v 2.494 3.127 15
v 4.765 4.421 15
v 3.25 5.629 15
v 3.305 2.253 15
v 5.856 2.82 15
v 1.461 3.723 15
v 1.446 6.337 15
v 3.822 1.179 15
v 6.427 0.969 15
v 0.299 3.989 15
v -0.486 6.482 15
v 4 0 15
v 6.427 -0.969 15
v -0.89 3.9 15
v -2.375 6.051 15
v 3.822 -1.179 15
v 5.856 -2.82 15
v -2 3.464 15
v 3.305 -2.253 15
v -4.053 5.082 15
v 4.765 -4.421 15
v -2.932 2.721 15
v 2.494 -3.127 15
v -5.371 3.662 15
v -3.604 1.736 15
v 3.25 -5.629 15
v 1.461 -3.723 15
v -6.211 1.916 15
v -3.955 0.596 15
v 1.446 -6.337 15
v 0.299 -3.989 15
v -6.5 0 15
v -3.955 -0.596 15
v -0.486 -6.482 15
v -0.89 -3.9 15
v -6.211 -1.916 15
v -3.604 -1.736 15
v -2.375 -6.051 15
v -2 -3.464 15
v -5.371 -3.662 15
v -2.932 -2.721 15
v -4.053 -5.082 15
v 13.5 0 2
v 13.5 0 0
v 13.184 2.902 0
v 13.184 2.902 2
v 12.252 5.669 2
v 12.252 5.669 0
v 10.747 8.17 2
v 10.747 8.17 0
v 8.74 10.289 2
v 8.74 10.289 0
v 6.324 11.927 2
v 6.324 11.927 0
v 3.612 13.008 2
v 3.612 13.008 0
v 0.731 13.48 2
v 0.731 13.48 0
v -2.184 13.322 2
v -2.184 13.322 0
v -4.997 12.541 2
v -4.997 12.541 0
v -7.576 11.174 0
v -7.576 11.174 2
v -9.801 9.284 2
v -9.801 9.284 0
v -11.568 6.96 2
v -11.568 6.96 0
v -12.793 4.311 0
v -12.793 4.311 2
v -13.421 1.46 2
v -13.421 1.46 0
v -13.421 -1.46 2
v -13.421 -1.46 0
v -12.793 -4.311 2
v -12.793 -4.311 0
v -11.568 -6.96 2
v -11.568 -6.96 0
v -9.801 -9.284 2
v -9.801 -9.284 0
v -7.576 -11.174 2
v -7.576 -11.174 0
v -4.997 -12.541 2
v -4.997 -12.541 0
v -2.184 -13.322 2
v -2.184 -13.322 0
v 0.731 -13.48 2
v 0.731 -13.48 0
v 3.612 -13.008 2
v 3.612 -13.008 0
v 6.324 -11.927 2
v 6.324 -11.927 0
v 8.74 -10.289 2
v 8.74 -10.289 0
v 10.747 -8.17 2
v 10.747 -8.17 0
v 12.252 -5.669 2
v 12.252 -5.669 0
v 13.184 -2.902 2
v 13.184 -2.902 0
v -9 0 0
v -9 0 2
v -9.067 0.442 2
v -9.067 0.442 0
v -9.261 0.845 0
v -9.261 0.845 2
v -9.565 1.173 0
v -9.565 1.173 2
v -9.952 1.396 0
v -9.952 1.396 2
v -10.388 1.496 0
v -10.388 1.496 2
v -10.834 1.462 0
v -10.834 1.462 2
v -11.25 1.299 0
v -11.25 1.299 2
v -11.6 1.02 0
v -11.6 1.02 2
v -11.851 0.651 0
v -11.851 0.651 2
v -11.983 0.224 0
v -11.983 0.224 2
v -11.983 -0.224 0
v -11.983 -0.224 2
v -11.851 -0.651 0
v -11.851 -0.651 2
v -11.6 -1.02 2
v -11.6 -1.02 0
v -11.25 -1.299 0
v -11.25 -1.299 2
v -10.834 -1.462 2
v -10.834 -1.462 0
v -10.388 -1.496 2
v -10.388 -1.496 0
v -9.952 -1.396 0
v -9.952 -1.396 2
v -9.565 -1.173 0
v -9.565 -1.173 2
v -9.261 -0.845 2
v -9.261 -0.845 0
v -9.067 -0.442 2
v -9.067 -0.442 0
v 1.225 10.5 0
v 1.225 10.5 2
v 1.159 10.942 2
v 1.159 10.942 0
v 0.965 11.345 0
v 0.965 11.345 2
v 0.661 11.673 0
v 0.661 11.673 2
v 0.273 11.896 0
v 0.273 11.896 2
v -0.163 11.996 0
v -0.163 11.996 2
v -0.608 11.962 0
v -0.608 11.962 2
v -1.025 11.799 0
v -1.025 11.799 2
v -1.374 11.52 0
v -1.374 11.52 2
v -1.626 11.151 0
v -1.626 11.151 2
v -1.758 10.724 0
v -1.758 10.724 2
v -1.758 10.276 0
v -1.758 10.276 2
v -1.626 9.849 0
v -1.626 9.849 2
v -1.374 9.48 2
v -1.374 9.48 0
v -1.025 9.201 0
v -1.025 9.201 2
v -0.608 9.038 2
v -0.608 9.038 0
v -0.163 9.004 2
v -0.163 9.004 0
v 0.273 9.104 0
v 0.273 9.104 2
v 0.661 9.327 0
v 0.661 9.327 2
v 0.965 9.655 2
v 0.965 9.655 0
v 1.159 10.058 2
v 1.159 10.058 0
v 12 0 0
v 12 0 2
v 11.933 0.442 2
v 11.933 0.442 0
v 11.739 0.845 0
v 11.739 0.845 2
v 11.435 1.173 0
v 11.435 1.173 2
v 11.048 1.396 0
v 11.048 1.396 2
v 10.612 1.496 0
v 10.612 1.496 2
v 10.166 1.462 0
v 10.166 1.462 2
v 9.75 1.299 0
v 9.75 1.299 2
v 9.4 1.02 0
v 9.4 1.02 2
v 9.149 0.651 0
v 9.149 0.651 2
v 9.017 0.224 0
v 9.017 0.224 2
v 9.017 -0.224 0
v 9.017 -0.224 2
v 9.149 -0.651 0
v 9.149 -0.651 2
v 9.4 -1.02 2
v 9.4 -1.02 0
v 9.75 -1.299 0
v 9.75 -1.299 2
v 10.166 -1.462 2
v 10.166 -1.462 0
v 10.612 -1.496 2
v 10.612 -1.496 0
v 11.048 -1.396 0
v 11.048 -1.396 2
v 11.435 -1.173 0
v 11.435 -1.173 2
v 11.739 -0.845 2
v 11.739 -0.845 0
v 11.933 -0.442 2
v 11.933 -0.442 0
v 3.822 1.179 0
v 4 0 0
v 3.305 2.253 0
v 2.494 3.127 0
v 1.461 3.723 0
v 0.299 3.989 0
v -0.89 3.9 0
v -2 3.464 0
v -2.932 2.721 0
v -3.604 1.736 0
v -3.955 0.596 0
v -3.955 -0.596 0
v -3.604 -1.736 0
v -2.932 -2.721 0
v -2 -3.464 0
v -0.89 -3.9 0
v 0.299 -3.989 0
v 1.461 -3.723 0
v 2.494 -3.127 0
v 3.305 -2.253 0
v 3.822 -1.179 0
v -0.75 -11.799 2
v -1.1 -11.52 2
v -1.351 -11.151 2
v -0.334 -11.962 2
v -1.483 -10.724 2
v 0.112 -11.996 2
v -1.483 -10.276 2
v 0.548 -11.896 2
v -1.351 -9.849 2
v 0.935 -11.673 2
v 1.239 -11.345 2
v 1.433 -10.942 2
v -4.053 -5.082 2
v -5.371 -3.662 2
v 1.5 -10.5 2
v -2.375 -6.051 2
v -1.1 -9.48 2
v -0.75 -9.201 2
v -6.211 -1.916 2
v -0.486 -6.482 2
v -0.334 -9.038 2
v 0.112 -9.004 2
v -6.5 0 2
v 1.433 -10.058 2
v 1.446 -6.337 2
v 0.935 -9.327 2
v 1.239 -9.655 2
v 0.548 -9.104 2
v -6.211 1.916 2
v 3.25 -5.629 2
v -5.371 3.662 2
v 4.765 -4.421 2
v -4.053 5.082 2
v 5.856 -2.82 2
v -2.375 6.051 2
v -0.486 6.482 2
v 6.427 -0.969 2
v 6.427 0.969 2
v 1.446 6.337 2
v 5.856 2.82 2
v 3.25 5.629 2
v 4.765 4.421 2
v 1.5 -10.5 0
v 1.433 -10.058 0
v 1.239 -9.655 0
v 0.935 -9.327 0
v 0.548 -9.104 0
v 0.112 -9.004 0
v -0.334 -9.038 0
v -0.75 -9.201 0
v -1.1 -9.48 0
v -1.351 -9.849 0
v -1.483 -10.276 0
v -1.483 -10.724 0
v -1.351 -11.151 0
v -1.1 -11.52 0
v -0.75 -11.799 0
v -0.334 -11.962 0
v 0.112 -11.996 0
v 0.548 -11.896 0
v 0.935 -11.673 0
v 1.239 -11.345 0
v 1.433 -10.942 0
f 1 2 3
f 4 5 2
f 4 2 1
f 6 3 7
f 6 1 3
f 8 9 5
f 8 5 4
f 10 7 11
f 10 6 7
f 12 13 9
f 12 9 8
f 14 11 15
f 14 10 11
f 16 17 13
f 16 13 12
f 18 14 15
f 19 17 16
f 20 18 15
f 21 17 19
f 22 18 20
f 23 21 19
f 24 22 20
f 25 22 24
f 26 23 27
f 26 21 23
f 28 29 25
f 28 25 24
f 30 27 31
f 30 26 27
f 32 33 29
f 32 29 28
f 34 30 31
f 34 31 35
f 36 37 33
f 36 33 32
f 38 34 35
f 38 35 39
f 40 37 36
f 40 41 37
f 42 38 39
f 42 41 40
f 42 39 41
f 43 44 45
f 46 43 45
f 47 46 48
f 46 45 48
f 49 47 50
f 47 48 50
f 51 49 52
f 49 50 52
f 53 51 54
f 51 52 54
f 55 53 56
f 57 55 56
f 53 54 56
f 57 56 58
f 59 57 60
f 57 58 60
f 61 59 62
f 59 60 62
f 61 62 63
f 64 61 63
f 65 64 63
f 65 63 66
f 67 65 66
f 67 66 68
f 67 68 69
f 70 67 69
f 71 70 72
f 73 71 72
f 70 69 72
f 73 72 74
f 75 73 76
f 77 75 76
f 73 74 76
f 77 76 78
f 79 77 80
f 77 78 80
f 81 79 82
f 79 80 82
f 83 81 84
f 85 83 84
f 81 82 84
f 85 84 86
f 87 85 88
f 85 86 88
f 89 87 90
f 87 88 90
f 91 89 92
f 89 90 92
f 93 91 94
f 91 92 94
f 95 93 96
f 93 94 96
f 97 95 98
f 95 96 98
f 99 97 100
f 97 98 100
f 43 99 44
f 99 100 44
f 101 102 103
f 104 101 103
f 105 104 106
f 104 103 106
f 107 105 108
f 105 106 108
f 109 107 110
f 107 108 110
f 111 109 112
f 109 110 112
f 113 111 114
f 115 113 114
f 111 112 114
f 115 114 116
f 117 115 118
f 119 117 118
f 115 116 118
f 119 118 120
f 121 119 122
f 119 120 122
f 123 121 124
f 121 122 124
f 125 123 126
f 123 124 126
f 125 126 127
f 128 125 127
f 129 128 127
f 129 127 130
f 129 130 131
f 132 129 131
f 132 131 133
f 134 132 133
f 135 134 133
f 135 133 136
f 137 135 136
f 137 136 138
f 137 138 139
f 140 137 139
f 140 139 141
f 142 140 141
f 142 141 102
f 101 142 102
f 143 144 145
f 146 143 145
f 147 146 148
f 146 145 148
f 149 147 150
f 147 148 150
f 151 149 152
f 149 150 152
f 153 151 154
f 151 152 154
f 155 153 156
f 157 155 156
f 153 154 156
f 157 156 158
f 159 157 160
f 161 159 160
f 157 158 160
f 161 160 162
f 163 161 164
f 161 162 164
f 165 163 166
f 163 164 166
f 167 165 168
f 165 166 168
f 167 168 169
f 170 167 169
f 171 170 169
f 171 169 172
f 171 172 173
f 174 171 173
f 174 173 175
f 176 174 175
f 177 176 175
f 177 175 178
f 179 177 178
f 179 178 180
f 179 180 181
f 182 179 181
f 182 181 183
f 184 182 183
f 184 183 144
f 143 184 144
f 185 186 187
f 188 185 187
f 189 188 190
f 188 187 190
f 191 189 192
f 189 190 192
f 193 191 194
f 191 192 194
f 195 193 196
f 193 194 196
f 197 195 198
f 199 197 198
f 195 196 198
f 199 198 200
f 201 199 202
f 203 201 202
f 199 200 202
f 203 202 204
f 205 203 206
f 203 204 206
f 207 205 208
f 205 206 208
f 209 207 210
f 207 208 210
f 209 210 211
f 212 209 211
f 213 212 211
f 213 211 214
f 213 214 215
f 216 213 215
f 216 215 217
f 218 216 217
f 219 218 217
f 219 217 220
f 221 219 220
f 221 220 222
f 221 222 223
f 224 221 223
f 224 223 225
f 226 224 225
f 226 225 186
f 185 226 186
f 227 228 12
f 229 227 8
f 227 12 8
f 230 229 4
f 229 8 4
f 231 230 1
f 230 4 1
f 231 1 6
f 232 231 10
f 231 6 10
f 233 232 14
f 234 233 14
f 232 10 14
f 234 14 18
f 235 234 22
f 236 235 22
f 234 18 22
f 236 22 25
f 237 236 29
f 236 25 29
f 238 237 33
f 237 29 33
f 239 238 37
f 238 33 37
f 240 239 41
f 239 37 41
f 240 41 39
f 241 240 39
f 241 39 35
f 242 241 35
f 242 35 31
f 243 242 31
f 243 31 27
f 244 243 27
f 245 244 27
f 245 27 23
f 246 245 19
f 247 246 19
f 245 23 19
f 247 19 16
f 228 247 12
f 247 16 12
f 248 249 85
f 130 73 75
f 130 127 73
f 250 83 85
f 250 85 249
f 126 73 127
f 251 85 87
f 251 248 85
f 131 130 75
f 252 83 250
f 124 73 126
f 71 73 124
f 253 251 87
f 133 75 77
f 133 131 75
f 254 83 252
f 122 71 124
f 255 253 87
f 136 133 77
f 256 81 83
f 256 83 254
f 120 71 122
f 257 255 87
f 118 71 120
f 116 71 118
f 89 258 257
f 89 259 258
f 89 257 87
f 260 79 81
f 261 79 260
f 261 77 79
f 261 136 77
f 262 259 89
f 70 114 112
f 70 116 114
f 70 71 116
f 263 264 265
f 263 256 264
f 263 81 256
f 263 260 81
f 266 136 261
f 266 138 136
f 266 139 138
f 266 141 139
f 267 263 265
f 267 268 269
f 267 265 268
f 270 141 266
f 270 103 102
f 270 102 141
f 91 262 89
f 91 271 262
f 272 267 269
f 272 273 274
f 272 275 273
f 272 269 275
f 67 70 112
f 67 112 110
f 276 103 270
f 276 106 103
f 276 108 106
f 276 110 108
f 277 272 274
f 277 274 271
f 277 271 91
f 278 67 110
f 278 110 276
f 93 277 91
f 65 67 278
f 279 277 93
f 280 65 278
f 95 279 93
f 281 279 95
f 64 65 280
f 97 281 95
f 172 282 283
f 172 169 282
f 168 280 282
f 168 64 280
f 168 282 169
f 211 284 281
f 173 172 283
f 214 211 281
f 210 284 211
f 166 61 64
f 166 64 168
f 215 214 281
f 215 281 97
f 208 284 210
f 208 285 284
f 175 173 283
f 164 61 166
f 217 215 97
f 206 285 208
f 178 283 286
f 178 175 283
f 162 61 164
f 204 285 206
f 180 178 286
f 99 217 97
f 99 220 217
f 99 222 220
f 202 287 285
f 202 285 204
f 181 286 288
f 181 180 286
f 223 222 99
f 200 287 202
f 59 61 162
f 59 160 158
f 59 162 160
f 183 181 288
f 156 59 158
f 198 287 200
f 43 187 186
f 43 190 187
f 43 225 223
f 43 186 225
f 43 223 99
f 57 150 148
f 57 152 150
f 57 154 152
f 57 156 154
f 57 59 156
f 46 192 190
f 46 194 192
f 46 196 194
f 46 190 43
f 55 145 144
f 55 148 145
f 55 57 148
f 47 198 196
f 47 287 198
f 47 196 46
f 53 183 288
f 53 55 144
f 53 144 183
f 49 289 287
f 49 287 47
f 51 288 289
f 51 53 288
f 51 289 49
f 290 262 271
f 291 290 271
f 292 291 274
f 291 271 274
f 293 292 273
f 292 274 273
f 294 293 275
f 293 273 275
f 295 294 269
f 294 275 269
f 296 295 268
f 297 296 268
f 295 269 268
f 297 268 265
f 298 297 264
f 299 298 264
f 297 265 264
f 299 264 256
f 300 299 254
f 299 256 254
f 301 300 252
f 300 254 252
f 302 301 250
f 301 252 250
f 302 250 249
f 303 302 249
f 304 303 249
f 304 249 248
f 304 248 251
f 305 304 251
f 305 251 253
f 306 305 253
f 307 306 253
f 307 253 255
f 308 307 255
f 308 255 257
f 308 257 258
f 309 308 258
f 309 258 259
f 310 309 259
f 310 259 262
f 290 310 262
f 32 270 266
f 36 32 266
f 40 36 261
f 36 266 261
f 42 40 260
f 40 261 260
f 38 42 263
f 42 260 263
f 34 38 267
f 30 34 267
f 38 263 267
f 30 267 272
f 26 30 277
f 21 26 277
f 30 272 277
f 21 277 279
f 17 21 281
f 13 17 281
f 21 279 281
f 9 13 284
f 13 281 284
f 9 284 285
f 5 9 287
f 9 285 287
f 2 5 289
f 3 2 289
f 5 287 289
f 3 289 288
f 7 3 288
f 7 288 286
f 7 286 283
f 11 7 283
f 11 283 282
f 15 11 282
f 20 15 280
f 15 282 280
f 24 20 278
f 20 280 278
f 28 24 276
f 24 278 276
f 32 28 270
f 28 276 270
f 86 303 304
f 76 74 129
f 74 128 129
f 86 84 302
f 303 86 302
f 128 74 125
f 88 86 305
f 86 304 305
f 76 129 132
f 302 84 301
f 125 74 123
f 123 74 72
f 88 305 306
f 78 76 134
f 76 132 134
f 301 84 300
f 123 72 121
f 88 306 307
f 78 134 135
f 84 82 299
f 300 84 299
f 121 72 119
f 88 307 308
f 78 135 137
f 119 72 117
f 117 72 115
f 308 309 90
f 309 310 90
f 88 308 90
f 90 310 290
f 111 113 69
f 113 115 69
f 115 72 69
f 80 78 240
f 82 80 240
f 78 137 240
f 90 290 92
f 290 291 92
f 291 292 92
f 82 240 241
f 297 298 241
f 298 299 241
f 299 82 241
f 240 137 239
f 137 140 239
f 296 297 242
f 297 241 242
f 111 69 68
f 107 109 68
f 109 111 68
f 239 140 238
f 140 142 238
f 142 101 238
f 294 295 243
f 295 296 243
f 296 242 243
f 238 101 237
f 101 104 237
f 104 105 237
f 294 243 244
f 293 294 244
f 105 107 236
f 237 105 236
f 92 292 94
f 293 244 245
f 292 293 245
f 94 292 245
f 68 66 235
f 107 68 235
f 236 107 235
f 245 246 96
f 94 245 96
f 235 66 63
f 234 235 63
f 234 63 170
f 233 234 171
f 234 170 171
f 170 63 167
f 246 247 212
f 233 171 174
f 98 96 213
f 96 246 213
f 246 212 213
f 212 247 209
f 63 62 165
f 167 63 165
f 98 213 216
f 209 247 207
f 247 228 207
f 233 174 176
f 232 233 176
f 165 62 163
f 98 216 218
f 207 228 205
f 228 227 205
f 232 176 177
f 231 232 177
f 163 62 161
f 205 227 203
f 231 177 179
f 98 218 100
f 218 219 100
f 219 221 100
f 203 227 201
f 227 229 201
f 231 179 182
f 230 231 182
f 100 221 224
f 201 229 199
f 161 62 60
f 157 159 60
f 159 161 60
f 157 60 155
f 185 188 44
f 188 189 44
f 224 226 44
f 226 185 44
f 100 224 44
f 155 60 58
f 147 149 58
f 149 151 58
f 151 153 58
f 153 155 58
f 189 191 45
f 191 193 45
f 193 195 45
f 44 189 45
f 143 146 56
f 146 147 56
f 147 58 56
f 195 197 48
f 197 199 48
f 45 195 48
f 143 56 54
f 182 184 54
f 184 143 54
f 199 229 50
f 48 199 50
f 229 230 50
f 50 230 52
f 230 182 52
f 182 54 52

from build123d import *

# Parameters (mm, degrees)
SKETCH_1_R          = 13.5
EXTRUDE_1_DEPTH     = 2
SKETCH_2_R          = 6.5
EXTRUDE_2_DEPTH     = 13
SKETCH_3_R          = 4
CUT_EXTRUDE_1_DEPTH = 15
SKETCH_4_R          = 1.5
CUT_EXTRUDE_2_DEPTH = 15


with BuildPart() as part:
    # 草图1 → 凸台-拉伸1 (new body)
    with BuildSketch(Plane.XY):
        Circle(SKETCH_1_R)
    extrude(amount=EXTRUDE_1_DEPTH)

    # 草图2 → 凸台-拉伸2 (add)
    with BuildSketch(Plane.XY.offset(2)):
        with Locations(Location((0, 0, 0), (0, 0, 180))):
            Circle(SKETCH_2_R)
    extrude(amount=EXTRUDE_2_DEPTH)

    # 草图3 → 切除-拉伸1 (cut)
    with BuildSketch(Plane.XY.offset(15)):
        Circle(SKETCH_3_R)
    extrude(amount=-CUT_EXTRUDE_1_DEPTH, mode=Mode.SUBTRACT)

    # 草图4 → 切除-拉伸2 (cut)
    with BuildSketch(Plane.XY.offset(2)):
        with Locations((-10.5, 0)):
            Circle(SKETCH_4_R)
        with Locations((-0.274707959, 10.5)):
            Circle(SKETCH_4_R)
        with Locations((10.5, 0)):
            Circle(SKETCH_4_R)
        with Locations((0, -10.5)):
            Circle(SKETCH_4_R)
    extrude(amount=-CUT_EXTRUDE_2_DEPTH, mode=Mode.SUBTRACT)


solid = part.part
